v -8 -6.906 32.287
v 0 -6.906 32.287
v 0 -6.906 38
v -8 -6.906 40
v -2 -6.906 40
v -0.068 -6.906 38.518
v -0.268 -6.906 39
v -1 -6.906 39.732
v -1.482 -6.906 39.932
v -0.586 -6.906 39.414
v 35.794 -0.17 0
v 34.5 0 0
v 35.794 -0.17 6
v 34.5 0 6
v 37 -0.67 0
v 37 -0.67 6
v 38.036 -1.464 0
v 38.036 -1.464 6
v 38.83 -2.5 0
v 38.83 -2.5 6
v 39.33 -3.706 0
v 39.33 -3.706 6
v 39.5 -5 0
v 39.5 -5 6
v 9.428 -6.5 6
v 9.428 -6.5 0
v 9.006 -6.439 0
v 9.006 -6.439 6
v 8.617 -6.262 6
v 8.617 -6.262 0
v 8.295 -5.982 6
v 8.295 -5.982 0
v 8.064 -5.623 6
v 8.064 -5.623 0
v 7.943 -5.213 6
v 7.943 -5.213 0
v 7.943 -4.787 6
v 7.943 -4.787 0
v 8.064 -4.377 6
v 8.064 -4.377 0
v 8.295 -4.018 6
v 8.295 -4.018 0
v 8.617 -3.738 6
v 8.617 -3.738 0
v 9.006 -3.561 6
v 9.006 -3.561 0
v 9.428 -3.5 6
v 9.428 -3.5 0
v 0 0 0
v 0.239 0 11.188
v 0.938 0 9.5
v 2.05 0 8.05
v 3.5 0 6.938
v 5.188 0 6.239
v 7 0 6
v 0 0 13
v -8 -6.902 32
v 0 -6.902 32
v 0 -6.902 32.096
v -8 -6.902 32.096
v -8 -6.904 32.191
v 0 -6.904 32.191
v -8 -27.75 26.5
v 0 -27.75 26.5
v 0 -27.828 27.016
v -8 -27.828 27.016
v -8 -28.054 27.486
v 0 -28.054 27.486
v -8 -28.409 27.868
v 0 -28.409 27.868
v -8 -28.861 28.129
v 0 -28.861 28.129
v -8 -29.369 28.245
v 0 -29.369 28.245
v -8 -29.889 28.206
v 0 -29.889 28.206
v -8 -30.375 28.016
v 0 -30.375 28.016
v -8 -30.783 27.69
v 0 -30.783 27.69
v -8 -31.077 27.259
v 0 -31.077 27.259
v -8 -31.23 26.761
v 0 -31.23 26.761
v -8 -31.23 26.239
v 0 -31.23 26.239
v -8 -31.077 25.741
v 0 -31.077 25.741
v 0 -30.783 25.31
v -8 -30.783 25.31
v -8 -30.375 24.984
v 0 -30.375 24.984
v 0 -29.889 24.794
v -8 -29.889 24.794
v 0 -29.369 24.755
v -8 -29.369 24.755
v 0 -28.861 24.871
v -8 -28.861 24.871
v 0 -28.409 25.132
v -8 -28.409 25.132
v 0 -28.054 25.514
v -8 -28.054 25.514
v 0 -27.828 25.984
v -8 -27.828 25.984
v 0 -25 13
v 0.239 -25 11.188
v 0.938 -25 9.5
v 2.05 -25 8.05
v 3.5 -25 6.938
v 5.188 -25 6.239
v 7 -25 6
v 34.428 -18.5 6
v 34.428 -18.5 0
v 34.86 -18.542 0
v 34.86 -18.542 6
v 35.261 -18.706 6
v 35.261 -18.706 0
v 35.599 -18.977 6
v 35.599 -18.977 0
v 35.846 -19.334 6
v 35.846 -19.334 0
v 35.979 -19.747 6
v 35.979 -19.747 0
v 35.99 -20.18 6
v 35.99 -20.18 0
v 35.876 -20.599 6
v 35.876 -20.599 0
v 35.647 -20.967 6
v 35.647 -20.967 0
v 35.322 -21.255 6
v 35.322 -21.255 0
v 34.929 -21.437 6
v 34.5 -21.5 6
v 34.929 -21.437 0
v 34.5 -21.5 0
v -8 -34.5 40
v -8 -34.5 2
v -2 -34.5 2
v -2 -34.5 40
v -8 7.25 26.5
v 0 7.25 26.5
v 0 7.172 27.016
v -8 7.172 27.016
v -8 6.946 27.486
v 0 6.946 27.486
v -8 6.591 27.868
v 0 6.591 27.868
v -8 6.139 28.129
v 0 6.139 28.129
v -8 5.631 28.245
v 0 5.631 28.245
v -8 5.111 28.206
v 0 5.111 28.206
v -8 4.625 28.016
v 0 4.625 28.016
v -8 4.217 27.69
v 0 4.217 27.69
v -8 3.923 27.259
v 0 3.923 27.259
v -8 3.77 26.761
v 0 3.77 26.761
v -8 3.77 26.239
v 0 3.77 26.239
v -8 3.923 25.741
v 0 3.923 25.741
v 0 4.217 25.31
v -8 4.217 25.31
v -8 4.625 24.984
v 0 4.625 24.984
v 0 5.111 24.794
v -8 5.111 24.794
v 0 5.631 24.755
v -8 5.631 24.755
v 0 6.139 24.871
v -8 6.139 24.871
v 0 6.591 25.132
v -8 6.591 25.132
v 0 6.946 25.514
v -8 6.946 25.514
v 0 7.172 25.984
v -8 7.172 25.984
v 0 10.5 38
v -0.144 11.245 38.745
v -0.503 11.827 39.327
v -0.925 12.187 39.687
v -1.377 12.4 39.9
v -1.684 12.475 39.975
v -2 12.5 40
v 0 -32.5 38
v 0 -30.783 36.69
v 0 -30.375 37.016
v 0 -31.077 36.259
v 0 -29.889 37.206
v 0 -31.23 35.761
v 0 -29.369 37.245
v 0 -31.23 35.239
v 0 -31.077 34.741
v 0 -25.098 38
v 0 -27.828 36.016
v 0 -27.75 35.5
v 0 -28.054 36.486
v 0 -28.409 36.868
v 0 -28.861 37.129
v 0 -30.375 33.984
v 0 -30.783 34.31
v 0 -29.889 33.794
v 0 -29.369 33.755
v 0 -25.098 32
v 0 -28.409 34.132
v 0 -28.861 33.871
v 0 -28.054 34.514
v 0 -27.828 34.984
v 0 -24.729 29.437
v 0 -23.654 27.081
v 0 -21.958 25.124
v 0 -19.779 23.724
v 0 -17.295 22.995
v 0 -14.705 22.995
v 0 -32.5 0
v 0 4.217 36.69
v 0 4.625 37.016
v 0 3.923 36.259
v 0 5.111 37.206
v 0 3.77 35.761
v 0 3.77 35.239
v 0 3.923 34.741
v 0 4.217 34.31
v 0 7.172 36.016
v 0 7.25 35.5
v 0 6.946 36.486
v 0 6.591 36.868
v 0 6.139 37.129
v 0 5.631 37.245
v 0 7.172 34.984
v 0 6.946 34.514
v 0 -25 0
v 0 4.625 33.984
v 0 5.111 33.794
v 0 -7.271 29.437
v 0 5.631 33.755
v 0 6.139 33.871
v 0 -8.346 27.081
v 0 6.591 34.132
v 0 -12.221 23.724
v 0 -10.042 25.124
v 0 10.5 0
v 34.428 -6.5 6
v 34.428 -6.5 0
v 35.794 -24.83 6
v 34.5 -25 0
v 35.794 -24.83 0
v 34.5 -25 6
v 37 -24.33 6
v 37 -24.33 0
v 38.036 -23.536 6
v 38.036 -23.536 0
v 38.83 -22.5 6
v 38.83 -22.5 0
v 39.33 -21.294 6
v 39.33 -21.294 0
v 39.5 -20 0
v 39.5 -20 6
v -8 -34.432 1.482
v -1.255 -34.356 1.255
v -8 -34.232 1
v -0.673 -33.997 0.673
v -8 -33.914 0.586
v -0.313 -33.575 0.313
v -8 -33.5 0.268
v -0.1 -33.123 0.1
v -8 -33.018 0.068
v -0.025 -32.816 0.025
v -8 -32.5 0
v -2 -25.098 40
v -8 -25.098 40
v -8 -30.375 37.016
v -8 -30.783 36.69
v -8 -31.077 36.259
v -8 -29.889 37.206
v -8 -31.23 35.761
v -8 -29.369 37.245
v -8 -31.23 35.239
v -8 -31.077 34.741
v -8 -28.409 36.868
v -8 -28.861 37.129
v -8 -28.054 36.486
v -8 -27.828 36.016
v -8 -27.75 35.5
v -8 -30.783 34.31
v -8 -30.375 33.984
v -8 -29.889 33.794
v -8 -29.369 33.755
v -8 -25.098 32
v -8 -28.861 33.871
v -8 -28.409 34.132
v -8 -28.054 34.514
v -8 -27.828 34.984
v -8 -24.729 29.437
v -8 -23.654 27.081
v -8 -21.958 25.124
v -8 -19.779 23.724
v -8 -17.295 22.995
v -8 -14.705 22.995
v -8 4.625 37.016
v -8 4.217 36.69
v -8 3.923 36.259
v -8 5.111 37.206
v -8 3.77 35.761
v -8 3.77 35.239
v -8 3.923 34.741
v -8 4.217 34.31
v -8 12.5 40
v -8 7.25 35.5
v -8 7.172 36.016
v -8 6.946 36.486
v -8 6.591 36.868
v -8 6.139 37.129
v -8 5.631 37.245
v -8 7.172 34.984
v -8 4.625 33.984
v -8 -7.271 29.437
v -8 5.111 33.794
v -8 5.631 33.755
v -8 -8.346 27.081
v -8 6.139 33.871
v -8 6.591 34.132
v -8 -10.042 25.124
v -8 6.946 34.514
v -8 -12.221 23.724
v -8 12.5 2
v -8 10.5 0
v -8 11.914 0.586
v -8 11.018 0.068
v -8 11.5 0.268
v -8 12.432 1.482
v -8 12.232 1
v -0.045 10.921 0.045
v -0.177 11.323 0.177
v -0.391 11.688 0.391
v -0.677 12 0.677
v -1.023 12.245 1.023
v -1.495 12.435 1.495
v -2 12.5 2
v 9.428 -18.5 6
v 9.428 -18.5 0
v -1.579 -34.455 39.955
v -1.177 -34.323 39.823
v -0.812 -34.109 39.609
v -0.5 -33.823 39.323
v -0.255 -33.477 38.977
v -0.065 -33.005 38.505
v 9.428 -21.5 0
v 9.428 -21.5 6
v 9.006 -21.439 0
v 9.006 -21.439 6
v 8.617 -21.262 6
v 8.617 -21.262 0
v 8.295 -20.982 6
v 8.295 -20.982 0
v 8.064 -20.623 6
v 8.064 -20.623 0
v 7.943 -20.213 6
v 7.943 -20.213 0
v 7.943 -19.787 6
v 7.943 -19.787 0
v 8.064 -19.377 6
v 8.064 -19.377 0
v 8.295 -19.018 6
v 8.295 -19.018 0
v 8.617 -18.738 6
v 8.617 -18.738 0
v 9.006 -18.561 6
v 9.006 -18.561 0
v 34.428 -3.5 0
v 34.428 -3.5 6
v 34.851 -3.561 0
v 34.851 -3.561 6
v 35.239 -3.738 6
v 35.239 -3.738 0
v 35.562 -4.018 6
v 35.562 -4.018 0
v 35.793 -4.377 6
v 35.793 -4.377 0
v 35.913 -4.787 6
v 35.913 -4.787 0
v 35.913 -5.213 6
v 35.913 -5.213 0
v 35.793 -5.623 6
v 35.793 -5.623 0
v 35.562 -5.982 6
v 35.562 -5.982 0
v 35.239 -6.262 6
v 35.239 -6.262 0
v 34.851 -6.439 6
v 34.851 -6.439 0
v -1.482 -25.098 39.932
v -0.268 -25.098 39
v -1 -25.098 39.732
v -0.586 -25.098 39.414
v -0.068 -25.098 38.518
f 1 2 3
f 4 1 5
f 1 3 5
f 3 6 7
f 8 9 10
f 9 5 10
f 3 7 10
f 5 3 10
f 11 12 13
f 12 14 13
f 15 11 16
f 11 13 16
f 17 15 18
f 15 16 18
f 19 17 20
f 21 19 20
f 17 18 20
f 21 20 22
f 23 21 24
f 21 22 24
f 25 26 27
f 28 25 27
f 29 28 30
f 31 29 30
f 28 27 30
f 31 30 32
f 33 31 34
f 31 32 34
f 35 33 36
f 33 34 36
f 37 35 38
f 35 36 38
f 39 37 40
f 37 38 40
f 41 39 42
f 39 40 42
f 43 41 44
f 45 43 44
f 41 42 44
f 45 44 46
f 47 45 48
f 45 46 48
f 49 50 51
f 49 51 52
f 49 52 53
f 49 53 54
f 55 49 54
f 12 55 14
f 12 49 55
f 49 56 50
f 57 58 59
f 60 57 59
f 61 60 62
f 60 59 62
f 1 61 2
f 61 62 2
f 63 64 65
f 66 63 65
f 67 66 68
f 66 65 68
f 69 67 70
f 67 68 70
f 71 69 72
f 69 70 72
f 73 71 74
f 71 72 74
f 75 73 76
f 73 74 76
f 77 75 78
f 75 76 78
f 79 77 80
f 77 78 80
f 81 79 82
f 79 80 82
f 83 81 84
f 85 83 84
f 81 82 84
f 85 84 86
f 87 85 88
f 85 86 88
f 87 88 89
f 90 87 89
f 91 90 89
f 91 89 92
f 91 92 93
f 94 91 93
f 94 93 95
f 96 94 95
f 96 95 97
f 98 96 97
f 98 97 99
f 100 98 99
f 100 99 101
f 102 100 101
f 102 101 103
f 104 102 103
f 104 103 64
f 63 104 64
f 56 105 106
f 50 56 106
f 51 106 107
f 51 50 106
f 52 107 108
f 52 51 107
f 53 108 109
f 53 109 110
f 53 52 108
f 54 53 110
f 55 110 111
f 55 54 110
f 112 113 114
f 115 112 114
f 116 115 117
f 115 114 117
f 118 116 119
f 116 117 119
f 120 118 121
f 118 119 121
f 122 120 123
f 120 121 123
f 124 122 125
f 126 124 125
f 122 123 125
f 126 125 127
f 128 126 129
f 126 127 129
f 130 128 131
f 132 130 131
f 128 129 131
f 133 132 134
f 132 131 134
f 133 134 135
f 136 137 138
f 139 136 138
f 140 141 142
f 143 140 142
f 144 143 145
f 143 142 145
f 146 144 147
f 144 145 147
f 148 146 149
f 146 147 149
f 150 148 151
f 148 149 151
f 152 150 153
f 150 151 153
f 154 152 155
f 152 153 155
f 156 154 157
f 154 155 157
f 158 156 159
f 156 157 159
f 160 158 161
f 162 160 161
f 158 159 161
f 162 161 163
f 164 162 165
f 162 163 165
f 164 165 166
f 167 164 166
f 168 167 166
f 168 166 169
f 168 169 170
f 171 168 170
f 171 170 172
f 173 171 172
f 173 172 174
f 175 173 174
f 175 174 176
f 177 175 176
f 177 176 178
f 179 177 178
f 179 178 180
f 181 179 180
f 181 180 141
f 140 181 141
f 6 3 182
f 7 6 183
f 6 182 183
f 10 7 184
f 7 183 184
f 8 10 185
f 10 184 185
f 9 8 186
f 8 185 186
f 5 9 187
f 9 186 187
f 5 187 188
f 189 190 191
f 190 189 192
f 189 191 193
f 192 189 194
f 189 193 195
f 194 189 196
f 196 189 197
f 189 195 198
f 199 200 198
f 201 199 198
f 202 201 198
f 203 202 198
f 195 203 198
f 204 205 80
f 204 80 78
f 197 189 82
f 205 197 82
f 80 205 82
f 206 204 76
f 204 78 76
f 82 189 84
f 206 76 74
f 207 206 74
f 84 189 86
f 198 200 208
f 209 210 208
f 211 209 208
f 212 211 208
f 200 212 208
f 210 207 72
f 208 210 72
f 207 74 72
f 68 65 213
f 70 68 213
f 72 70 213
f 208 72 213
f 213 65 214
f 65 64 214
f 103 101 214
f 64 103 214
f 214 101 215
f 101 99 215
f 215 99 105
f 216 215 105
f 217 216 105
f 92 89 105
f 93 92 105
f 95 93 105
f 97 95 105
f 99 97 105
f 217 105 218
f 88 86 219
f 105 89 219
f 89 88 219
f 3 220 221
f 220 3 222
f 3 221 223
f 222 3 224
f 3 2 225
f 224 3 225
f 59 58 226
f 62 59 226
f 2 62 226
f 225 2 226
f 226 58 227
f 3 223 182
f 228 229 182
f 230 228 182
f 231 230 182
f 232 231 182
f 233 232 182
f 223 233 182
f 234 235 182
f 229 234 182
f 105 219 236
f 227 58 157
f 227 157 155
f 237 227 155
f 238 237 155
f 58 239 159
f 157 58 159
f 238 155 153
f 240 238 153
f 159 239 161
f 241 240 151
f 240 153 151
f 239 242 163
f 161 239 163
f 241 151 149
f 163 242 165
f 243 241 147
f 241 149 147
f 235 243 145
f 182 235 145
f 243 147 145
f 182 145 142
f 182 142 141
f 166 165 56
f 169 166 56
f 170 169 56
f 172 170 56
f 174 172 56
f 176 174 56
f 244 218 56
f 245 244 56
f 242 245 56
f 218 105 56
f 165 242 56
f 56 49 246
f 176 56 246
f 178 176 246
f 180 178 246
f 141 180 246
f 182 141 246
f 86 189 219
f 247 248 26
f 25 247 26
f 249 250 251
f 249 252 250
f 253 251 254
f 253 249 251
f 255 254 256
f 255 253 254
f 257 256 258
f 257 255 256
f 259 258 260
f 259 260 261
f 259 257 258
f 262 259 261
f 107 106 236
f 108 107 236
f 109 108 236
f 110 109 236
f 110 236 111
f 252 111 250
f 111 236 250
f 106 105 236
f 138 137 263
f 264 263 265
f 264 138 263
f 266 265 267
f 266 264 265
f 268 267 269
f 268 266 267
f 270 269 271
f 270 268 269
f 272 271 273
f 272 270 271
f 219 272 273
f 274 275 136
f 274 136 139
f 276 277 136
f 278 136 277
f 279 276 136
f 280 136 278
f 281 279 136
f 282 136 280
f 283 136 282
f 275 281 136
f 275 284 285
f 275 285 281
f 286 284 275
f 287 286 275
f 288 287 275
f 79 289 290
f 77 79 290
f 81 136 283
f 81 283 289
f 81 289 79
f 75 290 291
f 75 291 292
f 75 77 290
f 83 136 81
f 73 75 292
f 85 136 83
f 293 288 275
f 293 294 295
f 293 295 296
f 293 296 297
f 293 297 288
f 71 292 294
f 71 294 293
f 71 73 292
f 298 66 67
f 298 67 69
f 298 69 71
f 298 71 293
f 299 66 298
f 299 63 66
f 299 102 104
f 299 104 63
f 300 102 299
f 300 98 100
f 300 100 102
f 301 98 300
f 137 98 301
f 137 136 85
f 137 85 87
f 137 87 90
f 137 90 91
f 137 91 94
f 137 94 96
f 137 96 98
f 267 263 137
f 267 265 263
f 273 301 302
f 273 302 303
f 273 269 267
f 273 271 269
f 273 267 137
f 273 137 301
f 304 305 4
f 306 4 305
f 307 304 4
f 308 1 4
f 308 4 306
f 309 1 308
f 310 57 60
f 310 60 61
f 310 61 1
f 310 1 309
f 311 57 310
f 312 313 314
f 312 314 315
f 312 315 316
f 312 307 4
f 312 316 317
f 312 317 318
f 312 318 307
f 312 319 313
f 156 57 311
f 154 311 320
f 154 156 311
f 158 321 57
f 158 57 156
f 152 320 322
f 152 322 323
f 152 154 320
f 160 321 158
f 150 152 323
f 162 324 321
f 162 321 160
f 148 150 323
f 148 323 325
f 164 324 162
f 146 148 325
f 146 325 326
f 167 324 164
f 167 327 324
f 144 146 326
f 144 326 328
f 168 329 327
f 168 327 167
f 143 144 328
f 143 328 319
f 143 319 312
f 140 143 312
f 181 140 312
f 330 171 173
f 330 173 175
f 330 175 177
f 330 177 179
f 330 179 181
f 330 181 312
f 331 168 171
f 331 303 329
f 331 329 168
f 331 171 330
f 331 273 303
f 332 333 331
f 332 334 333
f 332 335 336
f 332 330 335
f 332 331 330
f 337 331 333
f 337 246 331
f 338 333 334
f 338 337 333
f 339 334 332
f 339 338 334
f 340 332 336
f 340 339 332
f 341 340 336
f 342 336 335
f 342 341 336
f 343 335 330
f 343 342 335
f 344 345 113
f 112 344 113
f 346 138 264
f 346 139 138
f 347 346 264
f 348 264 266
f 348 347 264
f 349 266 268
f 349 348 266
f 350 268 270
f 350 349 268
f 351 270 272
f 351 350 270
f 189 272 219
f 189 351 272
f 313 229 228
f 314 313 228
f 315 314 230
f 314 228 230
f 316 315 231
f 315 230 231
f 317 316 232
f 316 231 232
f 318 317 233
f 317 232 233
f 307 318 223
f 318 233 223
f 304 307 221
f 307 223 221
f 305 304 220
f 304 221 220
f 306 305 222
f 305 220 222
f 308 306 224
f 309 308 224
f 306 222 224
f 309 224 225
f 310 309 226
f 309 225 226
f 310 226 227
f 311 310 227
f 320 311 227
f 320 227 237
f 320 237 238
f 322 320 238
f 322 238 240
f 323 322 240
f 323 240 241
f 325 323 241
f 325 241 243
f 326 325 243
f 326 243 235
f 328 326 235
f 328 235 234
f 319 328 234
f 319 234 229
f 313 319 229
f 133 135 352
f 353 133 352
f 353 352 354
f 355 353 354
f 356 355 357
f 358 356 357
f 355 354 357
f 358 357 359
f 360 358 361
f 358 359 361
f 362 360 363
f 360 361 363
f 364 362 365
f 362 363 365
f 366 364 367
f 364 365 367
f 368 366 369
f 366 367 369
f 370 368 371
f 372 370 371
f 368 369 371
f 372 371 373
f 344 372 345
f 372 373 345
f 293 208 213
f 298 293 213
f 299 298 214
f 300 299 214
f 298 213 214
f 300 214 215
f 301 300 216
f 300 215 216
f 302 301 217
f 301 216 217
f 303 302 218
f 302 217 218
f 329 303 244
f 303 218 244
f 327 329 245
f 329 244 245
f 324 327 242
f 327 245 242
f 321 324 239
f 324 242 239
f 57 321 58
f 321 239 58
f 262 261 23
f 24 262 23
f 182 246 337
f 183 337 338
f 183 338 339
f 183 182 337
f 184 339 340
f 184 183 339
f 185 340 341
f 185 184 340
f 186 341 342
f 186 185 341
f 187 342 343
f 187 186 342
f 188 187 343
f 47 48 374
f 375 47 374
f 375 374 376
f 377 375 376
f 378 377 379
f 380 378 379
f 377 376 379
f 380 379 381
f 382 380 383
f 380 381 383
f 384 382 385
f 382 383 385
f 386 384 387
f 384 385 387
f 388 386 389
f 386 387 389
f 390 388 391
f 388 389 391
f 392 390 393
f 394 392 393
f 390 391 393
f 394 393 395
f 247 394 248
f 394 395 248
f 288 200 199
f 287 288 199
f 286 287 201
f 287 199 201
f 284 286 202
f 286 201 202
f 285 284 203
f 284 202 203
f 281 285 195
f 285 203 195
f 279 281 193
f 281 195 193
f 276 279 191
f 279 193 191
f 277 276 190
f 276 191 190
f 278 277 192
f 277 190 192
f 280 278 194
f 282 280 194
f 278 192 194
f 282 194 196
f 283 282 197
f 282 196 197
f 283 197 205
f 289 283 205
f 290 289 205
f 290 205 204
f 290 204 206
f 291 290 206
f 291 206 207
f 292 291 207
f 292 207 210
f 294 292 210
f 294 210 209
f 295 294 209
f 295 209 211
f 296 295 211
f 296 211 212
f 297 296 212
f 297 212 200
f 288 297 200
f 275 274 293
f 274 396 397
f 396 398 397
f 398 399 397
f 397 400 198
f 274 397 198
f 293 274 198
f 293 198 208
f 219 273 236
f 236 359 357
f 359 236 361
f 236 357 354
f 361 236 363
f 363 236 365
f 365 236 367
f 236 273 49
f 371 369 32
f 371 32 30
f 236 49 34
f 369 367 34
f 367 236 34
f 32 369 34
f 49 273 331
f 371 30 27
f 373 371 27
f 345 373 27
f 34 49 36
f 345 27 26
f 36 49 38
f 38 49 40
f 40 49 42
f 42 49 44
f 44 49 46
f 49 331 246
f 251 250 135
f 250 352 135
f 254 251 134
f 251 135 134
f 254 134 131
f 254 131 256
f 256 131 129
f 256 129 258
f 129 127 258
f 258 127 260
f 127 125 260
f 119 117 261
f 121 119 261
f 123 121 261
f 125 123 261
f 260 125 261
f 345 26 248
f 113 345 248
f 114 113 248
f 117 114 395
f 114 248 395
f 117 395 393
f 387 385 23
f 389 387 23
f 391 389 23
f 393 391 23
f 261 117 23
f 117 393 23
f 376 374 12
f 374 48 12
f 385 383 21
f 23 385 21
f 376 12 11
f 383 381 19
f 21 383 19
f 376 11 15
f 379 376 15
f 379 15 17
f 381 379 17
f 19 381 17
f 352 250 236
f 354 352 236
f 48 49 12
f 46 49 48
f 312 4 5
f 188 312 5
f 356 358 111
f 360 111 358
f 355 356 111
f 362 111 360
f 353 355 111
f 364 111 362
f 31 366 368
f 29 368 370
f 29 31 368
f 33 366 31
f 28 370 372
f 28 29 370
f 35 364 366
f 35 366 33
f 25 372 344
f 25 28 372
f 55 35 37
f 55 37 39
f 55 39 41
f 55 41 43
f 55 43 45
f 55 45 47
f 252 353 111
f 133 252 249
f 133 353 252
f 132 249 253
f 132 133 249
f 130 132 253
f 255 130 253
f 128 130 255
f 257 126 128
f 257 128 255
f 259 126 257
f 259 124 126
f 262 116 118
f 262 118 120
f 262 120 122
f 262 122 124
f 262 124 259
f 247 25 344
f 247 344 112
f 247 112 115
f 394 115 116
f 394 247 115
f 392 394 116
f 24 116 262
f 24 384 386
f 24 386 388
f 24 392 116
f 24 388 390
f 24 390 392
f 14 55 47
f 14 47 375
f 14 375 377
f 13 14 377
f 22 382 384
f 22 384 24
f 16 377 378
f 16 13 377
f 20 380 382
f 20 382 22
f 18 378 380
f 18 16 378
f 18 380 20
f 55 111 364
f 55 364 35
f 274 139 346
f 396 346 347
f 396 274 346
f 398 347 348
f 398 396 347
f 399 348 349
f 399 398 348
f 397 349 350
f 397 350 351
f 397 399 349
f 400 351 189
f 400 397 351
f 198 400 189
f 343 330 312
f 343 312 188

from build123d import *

# Parameters (mm, degrees)
F0_W     = 39.5
F0_H     = 25
F1_DEPTH = 6
F2_R     = 5
F3_W     = 8
F3_H     = 47
F4_DEPTH = 25
F5_R     = 7
F6_DEPTH = 40
F7_R     = 1.75
F8_DEPTH = 25
F9_R     = 2


with BuildPart() as f1:
    # F0 (on Top) → F1 (new body)
    with BuildSketch(Plane.XY):
        with Locations((19.75, -12.5)):
            Rectangle(F0_W, F0_H)
        with BuildLine():
            ThreePointArc((9.428176, -21.5), (7.928176, -20), (9.428176, -18.5))
            Line((9.428176, -18.5), (34.428176, -18.5))
            ThreePointArc((34.428176, -18.5), (36.00043, -19.963218), (34.5, -21.5))
            Line((34.5, -21.5), (9.428176, -21.5))
        make_face(mode=Mode.SUBTRACT)
        with BuildLine():
            ThreePointArc((9.428176, -6.5), (7.928176, -5), (9.428176, -3.5))
            Line((9.428176, -3.5), (34.428176, -3.5))
            ThreePointArc((34.428176, -3.5), (35.928176, -5), (34.428176, -6.5))
            Line((34.428176, -6.5), (9.428176, -6.5))
        make_face(mode=Mode.SUBTRACT)
    extrude(amount=F1_DEPTH)

    # F2
    f2_edges = [f1.edges().sort_by_distance(p)[0] for p in [
        (39.5, 0, 3),
        (39.5, -25, 3),
    ]]
    fillet(f2_edges, radius=F2_R)

    # F3 (on Top) → F4 (join)
    with BuildSketch(Plane.XY):
        with Locations((-4, -11)):
            Rectangle(F3_W, F3_H)
    extrude(amount=F4_DEPTH)

    # F5
    f5_edges = [f1.edges().sort_by_distance(p)[0] for p in [
        (0, -12.5, 6),
        (0, -34.5, 12.5),
        (0, 12.5, 12.5),
    ]]
    fillet(f5_edges, radius=F5_R)

    # F3 (on Top) → F6 (join)
    with BuildSketch(Plane.XY):
        with Locations((-4, -11)):
            Rectangle(F3_W, F3_H)
    extrude(amount=F6_DEPTH)

    # F7 (on Right) → F8 (cut)
    with BuildSketch(Plane.YZ):
        with Locations((-29.5, 35.5)):
            Circle(F7_R)
        with Locations((5.5, 35.5)):
            Circle(F7_R)
        with Locations((5.5, 26.5)):
            Circle(F7_R)
        with Locations((-29.5, 26.5)):
            Circle(F7_R)
        with BuildLine():
            ThreePointArc((-25.098021, 32), (-16, 22.901979), (-6.901979, 32))
            ThreePointArc((-6.901979, 32), (-6.903109, 32.143378), (-6.906498, 32.286721))
            ThreePointArc((-6.906498, 32.286721), (-8.276915, 36.809152), (-11.730835, 40.03419))
            Line((-11.730835, 40.03419), (-20.269165, 40.03419))
            ThreePointArc((-20.269165, 40.03419), (-23.797914, 36.686845), (-25.098021, 32))
        make_face()
        with BuildLine():
            ThreePointArc((-11.730835, 40.03419), (-8.276915, 36.809152), (-6.906498, 32.286721))
            Line((-6.906498, 32.286721), (-6.906498, 40.03419))
            Line((-6.906498, 40.03419), (-11.730835, 40.03419))
        make_face()
        with BuildLine():
            Line((-25.098021, 40.03419), (-25.098021, 32))
            ThreePointArc((-25.098021, 32), (-23.797914, 36.686845), (-20.269165, 40.03419))
            Line((-20.269165, 40.03419), (-25.098021, 40.03419))
        make_face()
        with BuildLine():
            Line((-20.269165, 40.03419), (-11.730835, 40.03419))
            ThreePointArc((-11.730835, 40.03419), (-16, 41.098021), (-20.269165, 40.03419))
        make_face()
    extrude(amount=-F8_DEPTH, mode=Mode.SUBTRACT)

    # F9
    f9_edges = [f1.edges().sort_by_distance(p)[0] for p in [
        (0, 2.796751, 40),
        (0, -29.79901, 40),
        (0, -34.5, 20),
        (0, 12.5, 20),
        (-4, 12.5, 0),
        (-4, -34.5, 0),
    ]]
    fillet(f9_edges, radius=F9_R)


solid = f1.part
